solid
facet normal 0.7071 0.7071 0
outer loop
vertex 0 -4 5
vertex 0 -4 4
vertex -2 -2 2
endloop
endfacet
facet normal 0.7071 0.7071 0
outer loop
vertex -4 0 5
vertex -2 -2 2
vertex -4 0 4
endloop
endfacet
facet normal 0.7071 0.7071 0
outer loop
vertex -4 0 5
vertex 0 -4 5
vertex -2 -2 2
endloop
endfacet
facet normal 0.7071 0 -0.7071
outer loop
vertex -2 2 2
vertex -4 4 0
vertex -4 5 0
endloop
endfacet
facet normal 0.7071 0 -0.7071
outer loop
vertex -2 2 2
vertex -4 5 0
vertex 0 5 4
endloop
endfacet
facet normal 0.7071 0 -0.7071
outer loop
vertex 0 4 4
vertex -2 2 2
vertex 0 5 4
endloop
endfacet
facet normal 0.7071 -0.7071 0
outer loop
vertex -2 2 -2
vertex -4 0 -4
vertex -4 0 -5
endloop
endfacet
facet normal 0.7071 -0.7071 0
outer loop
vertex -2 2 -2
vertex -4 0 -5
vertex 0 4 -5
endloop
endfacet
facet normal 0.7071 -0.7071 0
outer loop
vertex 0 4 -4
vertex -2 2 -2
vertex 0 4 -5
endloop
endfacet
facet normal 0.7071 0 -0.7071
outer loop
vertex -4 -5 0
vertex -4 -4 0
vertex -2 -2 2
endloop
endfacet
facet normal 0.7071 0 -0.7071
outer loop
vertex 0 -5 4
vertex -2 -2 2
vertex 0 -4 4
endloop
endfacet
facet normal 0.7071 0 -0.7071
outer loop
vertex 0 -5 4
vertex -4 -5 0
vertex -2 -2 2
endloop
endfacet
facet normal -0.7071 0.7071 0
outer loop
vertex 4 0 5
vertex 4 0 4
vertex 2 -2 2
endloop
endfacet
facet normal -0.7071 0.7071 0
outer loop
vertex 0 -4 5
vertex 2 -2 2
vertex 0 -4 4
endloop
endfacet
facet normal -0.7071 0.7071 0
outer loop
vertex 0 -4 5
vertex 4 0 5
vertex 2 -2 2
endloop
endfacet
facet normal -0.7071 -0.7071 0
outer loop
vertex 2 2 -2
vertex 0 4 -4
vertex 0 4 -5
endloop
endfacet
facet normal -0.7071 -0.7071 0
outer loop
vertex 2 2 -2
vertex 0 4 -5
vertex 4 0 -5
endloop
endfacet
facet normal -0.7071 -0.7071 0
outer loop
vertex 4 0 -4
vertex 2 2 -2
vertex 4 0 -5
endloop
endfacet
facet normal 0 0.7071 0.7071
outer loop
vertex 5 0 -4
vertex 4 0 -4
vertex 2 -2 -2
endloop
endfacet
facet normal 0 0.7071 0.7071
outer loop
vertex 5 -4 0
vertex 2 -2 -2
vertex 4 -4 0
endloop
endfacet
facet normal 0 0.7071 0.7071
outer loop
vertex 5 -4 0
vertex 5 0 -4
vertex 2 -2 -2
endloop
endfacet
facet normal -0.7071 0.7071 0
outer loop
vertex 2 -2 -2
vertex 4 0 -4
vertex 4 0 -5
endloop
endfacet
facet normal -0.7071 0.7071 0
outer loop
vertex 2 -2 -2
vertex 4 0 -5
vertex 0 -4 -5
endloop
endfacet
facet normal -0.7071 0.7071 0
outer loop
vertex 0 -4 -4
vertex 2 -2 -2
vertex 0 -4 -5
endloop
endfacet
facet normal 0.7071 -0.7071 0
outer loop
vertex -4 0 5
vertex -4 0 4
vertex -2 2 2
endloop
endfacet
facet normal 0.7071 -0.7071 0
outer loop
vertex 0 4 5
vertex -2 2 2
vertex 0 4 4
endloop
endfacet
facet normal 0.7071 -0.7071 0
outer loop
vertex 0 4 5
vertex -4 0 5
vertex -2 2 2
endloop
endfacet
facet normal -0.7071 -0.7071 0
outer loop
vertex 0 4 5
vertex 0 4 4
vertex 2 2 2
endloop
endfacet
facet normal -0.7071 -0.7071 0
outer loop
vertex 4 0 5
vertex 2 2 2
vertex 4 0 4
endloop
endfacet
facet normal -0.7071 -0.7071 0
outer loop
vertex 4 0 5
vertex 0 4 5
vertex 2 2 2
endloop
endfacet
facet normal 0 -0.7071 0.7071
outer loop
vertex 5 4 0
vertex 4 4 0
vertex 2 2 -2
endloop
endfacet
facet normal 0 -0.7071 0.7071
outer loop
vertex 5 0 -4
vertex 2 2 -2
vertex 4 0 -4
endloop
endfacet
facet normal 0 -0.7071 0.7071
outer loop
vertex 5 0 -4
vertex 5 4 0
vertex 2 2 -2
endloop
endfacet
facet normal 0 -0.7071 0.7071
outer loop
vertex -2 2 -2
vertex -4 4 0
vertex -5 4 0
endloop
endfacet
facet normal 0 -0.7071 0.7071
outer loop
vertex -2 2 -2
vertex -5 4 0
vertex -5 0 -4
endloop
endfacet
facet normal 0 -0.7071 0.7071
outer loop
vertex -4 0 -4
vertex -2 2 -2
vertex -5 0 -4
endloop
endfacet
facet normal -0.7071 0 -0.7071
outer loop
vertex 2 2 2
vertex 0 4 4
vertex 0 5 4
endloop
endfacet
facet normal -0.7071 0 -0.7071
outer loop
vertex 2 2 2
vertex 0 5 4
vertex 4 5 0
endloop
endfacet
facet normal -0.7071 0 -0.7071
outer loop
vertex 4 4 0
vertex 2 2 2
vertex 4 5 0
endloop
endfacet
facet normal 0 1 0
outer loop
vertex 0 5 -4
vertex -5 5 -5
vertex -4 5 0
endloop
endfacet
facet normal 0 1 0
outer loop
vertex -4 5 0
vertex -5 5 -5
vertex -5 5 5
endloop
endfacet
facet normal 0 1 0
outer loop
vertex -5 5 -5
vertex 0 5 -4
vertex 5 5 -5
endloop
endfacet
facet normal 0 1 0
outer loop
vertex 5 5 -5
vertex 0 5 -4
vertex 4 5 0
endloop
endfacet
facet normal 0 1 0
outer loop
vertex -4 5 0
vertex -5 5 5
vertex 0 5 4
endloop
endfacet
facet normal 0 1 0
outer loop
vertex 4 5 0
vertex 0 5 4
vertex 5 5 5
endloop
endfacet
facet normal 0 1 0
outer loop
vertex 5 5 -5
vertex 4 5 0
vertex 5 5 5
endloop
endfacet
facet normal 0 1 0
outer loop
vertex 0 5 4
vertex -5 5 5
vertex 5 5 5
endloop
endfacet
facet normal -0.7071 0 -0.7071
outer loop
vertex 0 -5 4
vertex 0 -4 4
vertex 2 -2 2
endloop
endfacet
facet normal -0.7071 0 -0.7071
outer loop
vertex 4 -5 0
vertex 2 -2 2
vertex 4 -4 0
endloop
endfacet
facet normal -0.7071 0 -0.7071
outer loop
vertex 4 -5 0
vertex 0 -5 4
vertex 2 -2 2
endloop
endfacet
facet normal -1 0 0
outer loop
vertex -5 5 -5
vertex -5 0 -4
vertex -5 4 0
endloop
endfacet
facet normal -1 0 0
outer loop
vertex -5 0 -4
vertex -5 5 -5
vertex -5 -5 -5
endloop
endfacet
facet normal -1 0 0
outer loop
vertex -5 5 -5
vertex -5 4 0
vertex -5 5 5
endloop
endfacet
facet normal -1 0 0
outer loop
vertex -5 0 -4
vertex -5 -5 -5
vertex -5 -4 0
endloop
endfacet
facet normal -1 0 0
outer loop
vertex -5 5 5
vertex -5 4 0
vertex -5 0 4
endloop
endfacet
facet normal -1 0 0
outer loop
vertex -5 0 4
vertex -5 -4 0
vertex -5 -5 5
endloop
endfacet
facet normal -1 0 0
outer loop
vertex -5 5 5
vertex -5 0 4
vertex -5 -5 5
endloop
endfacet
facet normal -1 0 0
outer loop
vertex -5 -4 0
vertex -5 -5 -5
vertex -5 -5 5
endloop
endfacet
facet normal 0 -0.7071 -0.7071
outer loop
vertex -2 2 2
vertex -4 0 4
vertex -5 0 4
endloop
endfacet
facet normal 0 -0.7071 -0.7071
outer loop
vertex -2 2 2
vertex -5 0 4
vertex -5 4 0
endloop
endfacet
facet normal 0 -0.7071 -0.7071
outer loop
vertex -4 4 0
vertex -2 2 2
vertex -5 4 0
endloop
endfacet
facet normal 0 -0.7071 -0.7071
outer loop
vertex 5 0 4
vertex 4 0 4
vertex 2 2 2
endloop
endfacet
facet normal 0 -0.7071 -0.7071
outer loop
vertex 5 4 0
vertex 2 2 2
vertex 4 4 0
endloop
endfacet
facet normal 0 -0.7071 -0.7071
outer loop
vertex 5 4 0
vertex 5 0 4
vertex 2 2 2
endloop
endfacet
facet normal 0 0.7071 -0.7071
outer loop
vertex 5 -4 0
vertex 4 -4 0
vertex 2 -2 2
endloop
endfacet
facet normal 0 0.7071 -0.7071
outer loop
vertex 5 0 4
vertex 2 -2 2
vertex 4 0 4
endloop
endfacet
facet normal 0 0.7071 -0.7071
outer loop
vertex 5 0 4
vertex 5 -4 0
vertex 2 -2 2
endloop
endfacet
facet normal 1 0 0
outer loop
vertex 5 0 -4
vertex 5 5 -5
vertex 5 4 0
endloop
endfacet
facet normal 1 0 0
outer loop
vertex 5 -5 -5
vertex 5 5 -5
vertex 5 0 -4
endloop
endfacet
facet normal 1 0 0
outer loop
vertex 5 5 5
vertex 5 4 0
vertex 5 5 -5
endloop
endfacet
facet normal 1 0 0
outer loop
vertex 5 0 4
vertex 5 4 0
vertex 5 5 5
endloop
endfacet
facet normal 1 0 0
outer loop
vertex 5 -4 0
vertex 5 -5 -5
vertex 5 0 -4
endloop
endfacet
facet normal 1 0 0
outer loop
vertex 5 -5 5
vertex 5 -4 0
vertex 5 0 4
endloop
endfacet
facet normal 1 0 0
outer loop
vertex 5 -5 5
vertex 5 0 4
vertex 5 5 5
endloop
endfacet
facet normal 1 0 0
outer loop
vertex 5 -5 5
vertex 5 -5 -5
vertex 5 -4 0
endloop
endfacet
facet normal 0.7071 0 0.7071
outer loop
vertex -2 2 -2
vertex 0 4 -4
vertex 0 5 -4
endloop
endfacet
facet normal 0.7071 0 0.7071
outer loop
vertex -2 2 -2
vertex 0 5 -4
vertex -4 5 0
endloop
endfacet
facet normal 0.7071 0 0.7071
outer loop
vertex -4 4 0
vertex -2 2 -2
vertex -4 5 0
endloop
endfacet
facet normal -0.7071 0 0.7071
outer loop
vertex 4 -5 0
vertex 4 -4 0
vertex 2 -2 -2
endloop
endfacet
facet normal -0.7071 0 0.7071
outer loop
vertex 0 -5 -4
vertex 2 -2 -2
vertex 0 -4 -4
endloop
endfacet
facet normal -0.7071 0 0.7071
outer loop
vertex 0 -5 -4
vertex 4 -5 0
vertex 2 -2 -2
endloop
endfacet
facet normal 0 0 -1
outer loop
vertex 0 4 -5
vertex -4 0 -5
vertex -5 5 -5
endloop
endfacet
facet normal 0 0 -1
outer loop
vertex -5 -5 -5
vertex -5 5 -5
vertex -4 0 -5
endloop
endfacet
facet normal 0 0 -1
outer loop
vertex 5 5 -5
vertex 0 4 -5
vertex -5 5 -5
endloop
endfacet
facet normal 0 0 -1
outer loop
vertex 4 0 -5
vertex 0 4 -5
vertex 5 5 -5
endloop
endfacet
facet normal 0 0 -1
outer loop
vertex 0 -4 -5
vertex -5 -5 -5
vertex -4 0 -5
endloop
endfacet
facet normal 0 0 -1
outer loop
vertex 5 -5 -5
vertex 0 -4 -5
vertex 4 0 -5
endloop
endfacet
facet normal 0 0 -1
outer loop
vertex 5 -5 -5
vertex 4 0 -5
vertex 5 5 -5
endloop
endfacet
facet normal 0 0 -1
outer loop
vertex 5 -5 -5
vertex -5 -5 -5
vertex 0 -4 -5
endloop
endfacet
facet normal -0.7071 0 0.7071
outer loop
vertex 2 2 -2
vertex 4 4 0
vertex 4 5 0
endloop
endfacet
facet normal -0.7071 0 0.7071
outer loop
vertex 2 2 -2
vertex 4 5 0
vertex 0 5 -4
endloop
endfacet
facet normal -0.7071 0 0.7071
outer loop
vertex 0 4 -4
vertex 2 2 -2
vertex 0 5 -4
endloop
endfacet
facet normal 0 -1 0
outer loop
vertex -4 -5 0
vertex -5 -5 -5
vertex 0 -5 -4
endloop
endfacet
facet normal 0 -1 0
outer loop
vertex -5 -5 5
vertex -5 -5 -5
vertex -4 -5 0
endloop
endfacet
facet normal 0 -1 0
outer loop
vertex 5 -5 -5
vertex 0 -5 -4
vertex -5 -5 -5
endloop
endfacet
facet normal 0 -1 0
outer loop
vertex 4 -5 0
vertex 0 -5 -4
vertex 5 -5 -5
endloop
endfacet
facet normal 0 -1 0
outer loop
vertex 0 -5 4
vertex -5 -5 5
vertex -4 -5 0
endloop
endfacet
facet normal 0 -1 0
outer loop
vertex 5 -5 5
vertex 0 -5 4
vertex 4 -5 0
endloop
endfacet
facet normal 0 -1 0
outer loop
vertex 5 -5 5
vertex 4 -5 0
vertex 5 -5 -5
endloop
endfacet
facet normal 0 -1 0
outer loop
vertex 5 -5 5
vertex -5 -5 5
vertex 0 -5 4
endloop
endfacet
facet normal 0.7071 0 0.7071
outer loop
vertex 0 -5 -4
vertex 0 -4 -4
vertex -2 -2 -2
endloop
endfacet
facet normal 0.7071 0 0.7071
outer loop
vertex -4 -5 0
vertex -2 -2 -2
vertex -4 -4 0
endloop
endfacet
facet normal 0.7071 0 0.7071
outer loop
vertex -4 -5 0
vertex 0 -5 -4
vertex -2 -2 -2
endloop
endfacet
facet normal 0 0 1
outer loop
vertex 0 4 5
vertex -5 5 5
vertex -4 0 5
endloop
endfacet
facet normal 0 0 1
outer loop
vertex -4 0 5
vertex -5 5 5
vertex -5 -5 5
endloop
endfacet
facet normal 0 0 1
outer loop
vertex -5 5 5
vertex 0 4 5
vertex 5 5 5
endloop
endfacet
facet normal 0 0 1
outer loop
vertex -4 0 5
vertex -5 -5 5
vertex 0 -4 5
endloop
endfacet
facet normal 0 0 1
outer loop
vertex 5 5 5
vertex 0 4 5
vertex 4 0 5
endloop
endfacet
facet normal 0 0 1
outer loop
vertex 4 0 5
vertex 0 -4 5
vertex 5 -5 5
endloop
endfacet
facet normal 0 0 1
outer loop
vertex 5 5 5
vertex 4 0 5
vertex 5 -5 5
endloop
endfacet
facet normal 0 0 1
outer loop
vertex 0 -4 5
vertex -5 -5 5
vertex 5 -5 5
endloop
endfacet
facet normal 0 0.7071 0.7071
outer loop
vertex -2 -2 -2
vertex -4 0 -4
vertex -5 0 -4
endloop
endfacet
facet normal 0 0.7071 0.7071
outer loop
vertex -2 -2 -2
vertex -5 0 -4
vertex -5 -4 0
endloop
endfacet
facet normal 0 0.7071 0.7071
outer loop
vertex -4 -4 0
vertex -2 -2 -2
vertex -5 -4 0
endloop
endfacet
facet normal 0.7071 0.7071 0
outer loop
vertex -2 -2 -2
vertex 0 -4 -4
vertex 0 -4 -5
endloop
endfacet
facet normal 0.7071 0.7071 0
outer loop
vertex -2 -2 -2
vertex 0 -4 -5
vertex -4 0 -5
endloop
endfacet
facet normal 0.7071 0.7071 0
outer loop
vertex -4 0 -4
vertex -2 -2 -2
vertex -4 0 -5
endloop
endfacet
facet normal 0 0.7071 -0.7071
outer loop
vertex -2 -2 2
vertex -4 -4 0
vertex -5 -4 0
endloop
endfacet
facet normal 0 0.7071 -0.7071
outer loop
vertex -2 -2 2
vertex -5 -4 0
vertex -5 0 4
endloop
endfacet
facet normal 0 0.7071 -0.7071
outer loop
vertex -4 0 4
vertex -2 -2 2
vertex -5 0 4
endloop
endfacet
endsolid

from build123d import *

# Parameters (mm, degrees)
F0_W     = 10
F0_H     = 10
F3_DEPTH = 5
F1_W     = 10
F1_H     = 10
F4_DEPTH = 5
F2_W     = 10
F2_H     = 10
F5_DEPTH = 5


with BuildPart() as f3:
    # F0 (on Front) → F3 (new body, symmetric)
    with BuildSketch(Plane.XZ):
        Rectangle(F0_W, F0_H)
        Polygon((-4, 0), (0, 4), (4, 0), (0, -4), align=None, mode=Mode.SUBTRACT)
    extrude(amount=F3_DEPTH, both=True)

    # F1 (on Right) → F4 (intersect, symmetric)
    with BuildSketch(Plane.YZ):
        Rectangle(F1_W, F1_H)
        Polygon((-4, 0), (0, 4), (4, 0), (0, -4), align=None, mode=Mode.SUBTRACT)
    extrude(amount=F4_DEPTH, both=True, mode=Mode.INTERSECT)

    # F2 (on Top) → F5 (intersect, symmetric)
    with BuildSketch(Plane.XY):
        Rectangle(F2_W, F2_H)
        Polygon((-4, 0), (0, 4), (4, 0), (0, -4), align=None, mode=Mode.SUBTRACT)
    extrude(amount=F5_DEPTH, both=True, mode=Mode.INTERSECT)


solid = f3.part
